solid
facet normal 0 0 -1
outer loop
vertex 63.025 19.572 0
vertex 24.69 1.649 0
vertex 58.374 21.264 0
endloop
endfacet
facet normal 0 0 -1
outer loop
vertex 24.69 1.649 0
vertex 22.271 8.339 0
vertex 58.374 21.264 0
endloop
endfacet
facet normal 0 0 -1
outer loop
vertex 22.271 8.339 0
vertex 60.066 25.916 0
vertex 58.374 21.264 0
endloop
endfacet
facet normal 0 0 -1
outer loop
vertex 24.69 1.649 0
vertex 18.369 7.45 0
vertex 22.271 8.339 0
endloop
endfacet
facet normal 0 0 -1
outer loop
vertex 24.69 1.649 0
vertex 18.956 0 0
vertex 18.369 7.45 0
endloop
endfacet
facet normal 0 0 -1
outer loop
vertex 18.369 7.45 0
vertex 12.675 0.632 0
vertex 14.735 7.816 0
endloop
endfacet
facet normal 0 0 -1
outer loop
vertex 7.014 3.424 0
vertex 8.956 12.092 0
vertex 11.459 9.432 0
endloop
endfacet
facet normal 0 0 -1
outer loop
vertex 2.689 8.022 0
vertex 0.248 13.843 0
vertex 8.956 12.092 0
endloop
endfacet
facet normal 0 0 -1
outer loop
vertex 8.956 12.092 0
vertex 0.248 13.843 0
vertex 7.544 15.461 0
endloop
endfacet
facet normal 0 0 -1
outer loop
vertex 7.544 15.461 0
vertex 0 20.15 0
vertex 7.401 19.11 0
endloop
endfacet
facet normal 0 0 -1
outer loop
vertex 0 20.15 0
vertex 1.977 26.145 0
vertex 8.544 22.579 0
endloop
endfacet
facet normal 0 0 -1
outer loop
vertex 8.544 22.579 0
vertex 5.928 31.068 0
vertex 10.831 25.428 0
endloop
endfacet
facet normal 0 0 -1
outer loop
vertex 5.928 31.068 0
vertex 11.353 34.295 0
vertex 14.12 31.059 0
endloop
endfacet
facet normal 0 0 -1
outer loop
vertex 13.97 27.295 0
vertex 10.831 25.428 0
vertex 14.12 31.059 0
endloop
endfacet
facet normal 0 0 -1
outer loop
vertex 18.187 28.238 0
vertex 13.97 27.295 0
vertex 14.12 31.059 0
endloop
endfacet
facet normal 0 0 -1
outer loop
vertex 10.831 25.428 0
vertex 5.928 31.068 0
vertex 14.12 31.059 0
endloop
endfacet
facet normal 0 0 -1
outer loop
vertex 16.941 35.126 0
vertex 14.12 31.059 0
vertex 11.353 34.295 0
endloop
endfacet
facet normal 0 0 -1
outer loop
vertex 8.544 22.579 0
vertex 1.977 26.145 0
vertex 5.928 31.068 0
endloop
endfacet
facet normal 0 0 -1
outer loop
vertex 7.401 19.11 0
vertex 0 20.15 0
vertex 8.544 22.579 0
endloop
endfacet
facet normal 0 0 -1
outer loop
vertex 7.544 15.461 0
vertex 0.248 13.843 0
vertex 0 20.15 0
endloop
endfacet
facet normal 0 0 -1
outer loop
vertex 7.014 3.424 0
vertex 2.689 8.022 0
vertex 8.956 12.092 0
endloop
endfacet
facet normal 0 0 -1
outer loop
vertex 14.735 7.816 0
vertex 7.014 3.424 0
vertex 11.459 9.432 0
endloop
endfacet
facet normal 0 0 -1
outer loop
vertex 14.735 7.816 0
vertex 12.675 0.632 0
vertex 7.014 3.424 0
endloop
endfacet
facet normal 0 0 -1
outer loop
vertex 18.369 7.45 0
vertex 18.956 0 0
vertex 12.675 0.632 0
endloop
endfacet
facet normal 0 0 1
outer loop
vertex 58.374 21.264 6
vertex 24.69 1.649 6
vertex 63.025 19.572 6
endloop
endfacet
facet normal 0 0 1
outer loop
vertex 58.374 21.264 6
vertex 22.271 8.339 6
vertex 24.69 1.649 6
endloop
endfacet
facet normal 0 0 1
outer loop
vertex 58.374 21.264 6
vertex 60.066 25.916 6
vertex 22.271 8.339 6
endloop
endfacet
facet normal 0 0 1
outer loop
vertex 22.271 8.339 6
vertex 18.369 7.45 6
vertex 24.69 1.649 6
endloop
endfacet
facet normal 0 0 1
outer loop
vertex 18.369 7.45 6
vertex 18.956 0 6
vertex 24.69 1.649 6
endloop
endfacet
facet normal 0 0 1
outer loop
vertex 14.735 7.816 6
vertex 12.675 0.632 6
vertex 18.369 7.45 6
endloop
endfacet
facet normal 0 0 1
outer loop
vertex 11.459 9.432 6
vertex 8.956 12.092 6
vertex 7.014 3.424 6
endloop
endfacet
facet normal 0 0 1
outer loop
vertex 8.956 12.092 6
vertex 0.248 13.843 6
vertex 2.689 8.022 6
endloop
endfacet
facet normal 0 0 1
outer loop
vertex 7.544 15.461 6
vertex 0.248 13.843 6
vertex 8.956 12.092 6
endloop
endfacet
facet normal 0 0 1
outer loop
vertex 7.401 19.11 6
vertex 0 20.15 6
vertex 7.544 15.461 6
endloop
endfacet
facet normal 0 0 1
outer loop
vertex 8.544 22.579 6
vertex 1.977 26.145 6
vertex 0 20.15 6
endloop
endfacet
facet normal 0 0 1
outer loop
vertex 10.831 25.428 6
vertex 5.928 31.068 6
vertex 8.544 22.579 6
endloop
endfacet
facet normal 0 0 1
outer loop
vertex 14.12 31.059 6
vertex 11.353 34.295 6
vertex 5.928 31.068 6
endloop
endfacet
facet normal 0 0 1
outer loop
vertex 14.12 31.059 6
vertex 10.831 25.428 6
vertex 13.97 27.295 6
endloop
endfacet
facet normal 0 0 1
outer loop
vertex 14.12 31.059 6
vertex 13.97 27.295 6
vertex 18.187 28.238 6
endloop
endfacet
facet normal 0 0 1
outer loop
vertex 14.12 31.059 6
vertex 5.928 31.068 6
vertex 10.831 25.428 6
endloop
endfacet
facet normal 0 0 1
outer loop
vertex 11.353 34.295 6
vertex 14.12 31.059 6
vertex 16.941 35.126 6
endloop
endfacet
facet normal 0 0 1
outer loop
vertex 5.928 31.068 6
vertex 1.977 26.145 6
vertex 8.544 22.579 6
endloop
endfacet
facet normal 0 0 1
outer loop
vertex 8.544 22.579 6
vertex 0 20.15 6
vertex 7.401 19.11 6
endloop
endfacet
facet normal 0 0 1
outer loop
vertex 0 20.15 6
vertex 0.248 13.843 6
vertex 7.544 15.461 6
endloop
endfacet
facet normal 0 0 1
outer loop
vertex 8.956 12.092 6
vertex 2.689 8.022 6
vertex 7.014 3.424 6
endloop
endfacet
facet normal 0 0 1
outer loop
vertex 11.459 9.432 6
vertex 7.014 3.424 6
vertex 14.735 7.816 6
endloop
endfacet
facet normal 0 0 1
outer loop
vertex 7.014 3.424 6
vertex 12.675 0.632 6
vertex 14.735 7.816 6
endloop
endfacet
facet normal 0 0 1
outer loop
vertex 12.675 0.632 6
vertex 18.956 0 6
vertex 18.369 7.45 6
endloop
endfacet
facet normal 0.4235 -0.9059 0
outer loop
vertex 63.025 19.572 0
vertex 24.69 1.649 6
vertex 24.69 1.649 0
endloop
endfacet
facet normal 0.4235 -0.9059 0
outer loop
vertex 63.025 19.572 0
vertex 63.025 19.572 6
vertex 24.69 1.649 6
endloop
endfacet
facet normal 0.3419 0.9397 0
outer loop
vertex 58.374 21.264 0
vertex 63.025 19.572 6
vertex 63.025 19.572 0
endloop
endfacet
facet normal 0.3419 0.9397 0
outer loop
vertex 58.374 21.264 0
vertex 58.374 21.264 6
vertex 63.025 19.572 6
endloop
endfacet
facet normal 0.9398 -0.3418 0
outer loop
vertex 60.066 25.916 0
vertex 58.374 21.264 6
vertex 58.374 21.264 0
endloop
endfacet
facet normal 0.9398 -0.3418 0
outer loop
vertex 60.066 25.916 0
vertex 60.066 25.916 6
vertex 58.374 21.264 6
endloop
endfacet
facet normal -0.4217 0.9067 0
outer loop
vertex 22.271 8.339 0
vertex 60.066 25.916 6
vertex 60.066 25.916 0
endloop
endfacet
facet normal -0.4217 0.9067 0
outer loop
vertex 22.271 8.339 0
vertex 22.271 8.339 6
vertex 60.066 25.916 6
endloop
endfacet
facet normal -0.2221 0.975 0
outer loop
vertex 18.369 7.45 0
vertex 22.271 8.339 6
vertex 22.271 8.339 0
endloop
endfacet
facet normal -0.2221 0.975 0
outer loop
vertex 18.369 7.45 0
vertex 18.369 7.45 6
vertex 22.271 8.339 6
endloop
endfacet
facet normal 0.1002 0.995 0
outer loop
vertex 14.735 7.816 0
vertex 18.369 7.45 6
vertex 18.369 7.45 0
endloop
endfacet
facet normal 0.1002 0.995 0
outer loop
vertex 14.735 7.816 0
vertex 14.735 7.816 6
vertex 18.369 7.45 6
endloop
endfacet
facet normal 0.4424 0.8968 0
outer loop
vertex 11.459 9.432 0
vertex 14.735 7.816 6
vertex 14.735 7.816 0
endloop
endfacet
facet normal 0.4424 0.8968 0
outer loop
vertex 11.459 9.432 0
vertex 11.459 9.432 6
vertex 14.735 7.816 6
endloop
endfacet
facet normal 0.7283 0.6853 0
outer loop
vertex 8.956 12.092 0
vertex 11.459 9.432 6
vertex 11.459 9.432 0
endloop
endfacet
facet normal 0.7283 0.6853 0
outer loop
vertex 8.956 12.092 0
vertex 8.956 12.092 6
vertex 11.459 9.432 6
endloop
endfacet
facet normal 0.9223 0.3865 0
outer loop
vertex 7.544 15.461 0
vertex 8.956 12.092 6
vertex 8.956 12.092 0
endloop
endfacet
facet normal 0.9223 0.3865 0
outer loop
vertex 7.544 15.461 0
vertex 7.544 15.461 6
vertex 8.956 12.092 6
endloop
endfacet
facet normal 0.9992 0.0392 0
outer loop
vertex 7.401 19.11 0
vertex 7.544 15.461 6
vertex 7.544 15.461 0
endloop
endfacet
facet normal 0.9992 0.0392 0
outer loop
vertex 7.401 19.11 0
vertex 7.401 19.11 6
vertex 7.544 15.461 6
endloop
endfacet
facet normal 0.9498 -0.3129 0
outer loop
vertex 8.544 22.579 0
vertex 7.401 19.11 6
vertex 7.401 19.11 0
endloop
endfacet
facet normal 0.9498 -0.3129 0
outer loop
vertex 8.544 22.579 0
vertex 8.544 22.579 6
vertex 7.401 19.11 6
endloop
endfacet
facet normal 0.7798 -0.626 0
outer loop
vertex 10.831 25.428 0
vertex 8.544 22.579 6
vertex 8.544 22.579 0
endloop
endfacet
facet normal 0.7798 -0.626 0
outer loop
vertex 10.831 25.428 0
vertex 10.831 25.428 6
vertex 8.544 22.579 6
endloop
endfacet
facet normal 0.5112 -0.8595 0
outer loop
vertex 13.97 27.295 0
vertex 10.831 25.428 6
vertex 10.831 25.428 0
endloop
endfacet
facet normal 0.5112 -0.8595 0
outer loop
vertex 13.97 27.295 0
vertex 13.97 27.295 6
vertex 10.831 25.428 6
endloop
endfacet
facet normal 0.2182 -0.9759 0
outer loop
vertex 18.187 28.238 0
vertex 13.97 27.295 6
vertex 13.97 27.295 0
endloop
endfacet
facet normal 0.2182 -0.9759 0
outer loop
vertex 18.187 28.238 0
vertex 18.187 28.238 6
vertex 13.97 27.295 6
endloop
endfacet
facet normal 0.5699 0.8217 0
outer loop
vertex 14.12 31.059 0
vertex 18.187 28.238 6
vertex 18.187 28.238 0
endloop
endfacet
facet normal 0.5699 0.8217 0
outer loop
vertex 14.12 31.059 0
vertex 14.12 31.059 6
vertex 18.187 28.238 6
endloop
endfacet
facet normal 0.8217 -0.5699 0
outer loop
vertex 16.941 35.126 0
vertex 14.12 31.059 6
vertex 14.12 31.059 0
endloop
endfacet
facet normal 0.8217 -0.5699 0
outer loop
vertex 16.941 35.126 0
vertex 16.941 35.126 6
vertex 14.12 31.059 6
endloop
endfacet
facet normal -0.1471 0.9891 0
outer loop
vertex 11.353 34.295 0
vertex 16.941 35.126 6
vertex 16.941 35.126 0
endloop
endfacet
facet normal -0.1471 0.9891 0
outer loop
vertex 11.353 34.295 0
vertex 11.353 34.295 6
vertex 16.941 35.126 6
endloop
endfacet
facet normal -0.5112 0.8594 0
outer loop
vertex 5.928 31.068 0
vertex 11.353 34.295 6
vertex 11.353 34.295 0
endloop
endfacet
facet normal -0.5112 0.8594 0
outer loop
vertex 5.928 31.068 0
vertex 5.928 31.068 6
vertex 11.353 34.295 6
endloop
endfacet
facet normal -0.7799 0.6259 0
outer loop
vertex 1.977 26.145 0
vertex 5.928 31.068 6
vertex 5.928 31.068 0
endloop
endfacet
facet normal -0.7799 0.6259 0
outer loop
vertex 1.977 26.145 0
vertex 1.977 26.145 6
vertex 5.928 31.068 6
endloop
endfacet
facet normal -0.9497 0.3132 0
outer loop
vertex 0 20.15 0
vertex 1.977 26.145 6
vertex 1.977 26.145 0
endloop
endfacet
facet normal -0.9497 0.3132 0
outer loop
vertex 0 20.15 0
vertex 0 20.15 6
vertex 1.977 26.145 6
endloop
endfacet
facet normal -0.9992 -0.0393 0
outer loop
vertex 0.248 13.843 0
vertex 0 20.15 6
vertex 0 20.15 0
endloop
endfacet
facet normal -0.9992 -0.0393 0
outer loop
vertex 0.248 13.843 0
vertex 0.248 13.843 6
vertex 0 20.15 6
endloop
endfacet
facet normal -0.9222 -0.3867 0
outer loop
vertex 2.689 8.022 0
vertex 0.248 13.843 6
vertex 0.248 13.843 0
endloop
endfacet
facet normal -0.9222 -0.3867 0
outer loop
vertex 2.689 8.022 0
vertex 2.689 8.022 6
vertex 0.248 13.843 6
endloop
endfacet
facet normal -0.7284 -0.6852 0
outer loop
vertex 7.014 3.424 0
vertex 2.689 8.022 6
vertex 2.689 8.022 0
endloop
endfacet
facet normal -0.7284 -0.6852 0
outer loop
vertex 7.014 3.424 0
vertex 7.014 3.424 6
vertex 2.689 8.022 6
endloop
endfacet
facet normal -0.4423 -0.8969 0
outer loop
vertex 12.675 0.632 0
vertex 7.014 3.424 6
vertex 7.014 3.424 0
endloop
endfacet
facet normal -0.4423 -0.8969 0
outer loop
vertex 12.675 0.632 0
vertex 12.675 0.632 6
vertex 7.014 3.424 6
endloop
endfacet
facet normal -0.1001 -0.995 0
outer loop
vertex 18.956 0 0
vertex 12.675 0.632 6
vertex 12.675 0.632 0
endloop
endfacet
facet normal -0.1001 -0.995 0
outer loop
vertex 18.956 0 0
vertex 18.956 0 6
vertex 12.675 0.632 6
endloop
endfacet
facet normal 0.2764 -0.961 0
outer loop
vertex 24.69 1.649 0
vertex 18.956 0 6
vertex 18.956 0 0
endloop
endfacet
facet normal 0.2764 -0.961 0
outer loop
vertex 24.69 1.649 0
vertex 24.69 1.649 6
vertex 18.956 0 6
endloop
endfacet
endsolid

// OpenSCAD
$fn = 32;

// ----------------------------------------------------------------------
// Hook plate: curl radius 14 mm over 205 degrees, 7 mm thick band
// ----------------------------------------------------------------------

// --- parameters (mm) ---
profile_height = 6;       // extrusion height
profile_points = 26;      // points of the closed outline

profile = [[14.12, 31.059], [16.941, 35.126], [11.353, 34.295], [5.928, 31.068], [1.977, 26.145], [0, 20.15], [0.248, 13.843], [2.689, 8.022], [7.014, 3.424], [12.675, 0.632], [18.956, 0], [24.69, 1.649], [63.025, 19.572], [58.374, 21.264], [60.066, 25.916], [22.271, 8.339], [18.369, 7.45], [14.735, 7.816], [11.459, 9.432], [8.956, 12.092], [7.544, 15.461], [7.401, 19.11], [8.544, 22.579], [10.831, 25.428], [13.97, 27.295], [18.187, 28.238]];  // single closed polygon, 26 points, counter clockwise

// --- the one profile operation ---
linear_extrude(height = profile_height) polygon(points = profile);
